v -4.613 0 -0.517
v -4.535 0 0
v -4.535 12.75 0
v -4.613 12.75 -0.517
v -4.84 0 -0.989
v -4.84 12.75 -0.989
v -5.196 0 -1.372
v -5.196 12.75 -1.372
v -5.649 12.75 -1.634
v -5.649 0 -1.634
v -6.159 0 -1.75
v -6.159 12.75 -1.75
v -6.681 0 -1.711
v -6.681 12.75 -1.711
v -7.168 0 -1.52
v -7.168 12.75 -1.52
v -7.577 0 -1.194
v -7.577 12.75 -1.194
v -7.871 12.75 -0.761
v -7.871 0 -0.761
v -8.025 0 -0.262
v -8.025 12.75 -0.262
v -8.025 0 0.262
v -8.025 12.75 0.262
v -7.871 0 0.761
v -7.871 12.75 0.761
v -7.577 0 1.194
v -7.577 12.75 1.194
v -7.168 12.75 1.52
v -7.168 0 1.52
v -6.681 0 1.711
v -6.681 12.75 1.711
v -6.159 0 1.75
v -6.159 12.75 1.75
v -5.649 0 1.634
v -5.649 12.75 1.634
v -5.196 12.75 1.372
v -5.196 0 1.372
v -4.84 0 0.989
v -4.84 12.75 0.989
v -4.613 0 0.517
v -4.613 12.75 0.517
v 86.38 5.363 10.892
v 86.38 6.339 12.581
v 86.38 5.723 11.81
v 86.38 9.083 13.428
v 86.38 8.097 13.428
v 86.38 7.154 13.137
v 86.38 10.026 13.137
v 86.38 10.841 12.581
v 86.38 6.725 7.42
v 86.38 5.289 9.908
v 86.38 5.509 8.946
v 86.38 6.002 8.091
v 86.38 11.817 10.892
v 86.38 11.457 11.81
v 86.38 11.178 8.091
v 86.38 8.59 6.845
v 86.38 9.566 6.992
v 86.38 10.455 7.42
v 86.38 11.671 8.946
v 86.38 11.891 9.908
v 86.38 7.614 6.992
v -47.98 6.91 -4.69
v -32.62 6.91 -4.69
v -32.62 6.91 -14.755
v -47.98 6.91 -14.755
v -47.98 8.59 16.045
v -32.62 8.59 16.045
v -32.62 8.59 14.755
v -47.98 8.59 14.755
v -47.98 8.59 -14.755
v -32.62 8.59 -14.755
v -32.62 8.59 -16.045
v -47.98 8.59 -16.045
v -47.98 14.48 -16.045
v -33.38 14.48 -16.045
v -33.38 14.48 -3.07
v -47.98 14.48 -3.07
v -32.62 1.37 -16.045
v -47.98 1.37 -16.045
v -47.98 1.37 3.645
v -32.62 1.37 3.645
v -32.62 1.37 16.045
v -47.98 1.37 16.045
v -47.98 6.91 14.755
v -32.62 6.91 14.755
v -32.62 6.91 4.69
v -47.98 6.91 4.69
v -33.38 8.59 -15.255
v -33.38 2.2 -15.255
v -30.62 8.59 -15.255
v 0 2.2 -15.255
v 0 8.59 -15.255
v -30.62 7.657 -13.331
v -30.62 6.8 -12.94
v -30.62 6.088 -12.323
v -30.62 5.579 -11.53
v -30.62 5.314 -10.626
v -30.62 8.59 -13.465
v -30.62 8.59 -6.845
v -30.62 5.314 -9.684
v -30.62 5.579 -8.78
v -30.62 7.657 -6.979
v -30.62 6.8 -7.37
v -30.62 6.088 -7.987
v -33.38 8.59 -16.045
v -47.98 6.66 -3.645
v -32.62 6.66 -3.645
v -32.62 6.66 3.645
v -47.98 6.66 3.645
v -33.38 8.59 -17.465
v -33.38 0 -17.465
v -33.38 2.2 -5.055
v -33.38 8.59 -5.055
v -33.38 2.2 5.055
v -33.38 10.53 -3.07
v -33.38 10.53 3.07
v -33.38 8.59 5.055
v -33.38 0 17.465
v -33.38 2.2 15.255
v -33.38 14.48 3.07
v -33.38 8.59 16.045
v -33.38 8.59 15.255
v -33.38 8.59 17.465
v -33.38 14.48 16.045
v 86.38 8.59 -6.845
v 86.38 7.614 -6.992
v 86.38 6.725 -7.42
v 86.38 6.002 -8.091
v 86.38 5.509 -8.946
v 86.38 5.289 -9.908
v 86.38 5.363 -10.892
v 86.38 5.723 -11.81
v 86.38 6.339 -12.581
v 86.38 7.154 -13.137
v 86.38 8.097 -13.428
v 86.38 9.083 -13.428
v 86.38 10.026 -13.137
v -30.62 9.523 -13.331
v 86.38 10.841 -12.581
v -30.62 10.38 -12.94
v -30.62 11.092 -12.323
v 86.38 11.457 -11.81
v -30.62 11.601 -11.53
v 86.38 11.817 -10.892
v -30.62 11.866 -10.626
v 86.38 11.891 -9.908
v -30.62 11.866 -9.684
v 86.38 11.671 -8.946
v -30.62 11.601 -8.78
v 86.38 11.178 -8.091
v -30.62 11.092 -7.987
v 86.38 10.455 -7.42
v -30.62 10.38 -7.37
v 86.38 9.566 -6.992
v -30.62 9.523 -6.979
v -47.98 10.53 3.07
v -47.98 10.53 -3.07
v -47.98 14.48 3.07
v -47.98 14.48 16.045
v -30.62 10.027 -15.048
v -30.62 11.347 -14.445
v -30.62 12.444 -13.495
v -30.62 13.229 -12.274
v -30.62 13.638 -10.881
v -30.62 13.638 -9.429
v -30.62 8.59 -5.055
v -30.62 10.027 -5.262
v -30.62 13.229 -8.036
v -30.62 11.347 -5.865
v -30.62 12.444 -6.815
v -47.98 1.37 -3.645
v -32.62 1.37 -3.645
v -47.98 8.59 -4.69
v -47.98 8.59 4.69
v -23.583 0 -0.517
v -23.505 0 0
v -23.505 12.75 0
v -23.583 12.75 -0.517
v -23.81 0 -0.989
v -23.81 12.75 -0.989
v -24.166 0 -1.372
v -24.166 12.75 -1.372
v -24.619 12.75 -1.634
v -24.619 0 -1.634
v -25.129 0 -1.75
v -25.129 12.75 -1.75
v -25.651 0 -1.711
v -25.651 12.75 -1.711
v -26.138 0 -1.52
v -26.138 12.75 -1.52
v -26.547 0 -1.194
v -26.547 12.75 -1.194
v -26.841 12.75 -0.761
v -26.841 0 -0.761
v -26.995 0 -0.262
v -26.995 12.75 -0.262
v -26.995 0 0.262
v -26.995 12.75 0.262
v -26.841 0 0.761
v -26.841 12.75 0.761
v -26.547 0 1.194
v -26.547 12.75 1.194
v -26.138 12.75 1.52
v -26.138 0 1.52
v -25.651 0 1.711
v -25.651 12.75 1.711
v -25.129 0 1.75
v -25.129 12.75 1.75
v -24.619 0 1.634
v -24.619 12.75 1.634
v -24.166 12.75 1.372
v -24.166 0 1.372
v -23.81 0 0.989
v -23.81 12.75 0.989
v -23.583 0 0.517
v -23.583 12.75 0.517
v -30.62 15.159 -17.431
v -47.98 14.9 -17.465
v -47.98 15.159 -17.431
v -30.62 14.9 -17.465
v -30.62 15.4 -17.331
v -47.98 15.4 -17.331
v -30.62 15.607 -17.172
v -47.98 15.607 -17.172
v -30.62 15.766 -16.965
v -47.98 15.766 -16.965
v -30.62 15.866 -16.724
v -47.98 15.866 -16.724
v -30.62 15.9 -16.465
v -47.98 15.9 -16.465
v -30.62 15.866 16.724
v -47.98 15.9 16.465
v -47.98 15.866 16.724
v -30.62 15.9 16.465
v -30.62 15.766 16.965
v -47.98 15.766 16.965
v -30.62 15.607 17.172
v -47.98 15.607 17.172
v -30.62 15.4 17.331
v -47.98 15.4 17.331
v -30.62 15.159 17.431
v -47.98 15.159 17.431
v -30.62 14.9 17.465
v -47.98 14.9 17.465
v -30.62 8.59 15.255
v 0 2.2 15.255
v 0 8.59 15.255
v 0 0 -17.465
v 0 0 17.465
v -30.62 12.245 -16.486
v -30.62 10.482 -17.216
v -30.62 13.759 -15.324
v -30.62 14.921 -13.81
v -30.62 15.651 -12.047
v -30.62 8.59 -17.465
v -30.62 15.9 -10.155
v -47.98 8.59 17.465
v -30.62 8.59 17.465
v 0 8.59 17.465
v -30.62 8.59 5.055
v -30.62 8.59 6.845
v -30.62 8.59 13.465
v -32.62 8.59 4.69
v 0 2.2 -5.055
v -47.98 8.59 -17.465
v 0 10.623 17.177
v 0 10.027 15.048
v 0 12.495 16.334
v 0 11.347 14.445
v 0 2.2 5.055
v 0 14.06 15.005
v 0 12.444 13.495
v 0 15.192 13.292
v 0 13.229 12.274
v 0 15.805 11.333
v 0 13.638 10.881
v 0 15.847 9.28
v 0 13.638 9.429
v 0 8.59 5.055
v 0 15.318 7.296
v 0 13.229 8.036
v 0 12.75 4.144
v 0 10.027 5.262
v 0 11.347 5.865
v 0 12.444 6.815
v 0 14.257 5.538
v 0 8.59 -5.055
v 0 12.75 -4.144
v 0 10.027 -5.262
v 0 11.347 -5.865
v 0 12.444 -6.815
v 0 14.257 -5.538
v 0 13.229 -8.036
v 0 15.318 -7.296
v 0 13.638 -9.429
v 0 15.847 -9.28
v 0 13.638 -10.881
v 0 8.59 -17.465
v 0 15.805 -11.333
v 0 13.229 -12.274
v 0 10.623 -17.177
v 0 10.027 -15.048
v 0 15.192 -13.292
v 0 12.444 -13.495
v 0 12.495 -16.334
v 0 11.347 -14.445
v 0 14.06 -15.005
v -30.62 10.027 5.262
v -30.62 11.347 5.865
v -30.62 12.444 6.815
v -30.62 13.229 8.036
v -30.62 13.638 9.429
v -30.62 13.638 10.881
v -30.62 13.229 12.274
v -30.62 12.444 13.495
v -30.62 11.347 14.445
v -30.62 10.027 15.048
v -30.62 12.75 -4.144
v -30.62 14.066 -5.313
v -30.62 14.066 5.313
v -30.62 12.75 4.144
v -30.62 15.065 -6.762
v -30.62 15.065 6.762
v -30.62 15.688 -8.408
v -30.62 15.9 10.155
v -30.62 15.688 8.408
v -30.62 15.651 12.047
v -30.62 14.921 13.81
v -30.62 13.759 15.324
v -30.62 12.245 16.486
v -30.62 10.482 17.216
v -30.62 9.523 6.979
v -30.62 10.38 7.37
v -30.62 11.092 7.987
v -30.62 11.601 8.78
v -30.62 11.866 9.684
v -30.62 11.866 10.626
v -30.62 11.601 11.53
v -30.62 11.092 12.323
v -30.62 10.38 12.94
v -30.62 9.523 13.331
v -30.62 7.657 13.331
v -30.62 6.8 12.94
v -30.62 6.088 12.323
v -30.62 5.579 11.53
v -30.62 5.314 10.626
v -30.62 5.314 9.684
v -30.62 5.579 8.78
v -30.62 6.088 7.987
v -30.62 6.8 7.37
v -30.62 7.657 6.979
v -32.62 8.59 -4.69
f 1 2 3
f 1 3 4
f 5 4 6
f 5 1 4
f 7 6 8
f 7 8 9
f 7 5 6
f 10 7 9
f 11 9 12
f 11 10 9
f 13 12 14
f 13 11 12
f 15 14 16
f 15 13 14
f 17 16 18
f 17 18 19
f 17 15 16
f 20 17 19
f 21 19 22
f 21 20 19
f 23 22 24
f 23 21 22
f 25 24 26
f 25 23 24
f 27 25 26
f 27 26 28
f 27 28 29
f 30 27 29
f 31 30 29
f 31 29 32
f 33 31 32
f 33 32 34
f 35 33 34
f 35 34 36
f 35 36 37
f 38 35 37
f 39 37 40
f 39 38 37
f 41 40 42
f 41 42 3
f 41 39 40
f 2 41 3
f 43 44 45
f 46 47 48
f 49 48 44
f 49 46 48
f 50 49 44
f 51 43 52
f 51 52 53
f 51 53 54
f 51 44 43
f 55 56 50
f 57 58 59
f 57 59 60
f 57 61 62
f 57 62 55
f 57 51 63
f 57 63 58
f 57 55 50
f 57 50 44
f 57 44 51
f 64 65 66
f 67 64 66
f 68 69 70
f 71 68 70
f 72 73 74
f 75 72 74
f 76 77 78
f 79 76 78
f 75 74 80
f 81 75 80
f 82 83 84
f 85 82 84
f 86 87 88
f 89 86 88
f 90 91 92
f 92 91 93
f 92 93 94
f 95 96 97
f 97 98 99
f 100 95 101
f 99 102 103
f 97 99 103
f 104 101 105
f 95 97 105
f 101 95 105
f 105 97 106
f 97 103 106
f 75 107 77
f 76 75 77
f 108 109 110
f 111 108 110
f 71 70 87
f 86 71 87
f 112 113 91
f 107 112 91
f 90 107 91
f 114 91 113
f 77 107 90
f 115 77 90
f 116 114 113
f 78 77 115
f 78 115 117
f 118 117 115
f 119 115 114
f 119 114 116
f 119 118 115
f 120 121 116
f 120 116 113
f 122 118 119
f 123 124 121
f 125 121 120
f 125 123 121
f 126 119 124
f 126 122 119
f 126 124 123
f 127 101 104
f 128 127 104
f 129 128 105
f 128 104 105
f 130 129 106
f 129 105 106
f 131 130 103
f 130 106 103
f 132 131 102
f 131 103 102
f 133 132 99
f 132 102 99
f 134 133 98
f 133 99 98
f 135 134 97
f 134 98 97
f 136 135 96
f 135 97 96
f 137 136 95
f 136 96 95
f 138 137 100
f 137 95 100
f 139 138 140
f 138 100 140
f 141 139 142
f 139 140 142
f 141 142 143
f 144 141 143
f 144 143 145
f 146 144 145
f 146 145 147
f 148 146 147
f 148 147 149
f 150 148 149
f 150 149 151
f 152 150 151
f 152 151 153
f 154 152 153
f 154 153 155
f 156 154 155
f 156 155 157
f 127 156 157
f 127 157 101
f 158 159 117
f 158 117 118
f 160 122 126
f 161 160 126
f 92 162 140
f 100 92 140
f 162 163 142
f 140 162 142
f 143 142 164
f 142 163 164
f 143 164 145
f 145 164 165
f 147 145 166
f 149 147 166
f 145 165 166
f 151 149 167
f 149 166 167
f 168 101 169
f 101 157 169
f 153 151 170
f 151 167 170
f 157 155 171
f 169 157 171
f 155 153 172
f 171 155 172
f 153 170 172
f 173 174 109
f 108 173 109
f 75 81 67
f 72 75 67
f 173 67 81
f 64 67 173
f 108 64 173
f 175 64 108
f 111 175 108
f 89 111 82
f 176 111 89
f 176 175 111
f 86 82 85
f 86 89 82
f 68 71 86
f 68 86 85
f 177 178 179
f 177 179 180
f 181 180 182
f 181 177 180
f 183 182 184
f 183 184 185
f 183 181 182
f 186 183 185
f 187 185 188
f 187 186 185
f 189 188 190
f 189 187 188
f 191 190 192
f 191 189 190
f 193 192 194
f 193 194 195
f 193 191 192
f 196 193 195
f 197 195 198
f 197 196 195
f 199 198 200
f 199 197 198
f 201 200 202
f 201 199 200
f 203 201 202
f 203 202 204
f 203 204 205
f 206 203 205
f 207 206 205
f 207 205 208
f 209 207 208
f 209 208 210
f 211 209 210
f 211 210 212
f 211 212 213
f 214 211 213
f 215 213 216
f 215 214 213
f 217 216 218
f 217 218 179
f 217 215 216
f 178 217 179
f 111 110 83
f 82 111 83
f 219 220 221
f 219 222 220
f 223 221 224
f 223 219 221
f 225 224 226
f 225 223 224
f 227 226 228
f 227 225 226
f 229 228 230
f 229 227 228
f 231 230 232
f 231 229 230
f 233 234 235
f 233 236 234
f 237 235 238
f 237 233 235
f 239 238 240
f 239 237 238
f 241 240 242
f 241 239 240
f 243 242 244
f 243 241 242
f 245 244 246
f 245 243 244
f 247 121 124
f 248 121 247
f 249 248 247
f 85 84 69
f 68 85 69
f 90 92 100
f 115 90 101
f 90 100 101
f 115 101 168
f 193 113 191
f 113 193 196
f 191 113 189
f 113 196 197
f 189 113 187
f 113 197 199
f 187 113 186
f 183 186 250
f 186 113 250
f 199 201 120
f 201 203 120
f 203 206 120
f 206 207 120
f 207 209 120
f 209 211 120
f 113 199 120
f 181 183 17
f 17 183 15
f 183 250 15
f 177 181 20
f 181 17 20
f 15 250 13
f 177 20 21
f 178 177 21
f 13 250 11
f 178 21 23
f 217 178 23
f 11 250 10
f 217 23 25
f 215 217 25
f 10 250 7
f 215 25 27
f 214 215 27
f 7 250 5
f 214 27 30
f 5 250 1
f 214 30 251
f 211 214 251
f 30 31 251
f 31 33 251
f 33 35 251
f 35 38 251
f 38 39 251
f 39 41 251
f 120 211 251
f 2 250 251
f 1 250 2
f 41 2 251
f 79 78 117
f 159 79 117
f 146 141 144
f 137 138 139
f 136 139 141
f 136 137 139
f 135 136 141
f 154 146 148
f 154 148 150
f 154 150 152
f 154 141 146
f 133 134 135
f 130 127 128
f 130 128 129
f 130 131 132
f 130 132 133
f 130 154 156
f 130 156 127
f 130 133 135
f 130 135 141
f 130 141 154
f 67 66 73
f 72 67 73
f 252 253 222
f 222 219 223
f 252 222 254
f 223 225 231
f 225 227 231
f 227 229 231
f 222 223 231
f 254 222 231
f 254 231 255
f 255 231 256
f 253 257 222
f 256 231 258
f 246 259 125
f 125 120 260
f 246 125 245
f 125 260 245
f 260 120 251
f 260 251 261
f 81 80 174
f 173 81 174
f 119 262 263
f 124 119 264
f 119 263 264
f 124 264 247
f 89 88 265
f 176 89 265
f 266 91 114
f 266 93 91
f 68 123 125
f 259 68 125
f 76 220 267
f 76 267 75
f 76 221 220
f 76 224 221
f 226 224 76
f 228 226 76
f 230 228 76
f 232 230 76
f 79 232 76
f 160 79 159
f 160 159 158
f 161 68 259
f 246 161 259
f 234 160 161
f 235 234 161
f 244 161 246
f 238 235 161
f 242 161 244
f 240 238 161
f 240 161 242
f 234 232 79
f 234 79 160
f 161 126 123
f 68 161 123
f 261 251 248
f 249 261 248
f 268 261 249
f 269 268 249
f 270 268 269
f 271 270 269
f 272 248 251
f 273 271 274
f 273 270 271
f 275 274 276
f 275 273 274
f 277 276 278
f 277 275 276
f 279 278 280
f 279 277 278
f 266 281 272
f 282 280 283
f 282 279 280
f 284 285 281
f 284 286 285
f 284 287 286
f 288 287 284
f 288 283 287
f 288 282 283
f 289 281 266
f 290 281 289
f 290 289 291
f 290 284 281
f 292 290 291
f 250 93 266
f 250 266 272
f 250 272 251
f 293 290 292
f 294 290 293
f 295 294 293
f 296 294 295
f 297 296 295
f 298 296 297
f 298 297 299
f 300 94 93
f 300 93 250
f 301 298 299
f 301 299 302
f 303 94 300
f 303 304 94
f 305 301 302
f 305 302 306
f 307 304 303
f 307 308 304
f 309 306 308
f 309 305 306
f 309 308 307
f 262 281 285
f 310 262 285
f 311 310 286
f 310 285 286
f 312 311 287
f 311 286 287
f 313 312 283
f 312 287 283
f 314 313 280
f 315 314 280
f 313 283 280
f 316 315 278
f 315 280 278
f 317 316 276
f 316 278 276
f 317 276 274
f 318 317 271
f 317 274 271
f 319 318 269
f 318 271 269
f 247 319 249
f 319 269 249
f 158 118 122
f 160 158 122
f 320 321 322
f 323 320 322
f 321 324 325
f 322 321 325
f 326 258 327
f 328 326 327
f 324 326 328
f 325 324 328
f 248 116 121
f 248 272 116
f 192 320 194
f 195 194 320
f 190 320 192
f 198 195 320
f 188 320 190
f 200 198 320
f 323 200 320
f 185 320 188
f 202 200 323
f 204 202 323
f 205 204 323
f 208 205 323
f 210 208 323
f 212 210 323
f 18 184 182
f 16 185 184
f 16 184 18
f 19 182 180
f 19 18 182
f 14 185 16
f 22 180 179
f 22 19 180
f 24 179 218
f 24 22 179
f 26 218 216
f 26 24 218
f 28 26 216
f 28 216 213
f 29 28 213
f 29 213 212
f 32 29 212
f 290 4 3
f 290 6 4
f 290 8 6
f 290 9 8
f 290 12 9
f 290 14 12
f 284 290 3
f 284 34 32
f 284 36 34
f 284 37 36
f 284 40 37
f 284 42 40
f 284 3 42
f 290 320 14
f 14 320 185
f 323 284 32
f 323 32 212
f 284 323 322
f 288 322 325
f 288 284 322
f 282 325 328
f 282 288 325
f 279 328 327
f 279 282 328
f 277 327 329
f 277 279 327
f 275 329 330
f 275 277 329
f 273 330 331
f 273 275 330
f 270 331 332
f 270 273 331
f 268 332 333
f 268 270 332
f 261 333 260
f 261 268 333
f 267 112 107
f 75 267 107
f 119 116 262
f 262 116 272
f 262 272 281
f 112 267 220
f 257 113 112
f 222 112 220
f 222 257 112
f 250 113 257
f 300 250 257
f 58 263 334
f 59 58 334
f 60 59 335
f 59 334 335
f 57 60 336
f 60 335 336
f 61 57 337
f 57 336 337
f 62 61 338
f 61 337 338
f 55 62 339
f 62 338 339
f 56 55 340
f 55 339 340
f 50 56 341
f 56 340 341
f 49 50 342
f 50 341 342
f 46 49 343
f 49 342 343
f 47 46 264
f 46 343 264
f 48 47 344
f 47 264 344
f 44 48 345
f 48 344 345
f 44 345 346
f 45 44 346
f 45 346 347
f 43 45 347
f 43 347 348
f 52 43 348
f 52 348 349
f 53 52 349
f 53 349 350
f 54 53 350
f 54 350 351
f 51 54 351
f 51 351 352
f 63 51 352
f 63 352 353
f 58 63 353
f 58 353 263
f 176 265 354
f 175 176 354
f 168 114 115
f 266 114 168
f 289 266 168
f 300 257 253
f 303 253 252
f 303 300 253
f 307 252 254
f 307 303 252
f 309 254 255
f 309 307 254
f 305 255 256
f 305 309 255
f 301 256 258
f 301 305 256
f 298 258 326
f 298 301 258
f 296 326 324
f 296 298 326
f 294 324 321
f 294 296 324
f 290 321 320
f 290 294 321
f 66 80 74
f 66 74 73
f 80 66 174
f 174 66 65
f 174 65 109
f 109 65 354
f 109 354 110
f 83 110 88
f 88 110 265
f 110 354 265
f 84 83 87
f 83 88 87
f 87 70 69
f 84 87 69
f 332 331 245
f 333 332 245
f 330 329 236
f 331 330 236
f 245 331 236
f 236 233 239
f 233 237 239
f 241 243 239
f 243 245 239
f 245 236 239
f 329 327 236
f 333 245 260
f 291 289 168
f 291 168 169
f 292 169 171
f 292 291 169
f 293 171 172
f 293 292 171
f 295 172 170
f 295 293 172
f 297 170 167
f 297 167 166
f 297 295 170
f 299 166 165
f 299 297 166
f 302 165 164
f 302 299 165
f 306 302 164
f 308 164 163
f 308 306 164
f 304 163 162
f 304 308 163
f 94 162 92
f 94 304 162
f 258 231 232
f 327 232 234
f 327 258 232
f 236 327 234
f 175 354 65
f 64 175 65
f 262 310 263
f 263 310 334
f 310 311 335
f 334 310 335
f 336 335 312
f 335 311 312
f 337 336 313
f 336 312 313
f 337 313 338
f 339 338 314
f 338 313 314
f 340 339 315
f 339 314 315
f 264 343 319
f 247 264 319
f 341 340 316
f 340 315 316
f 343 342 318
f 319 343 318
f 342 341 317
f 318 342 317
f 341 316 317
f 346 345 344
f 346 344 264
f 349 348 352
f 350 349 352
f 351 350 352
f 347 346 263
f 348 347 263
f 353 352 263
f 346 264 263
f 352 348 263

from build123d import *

# Parameters (mm, degrees)
EXTRUDE1_DEPTH  = 30.62
SKETCH2_W       = 34.93
SKETCH2_H       = 15.9
SKETCH2_W_2     = 10.2
SKETCH2_H_2     = 6.39
EXTRUDE2_DEPTH  = 2.76
EXTRUDE3_DEPTH  = 15.36
EXTRUDE4_DEPTH  = 15.36
FILLET1_R       = 1
SKETCH4_R       = 3.31
EXTRUDE5_DEPTH  = 117
HOLE1_OUTLINE_R = 1.755
HOLE1_DEPTH     = 12.75
LPATTERN1_COUNT = 2
LPATTERN1_PITCH = 18.97


# Read off the part's stored shape, not the designer's step: Hole1
with BuildPart() as part:
    # Sketch1 → Extrude1 (new body)
    with BuildSketch(Plane(origin=(0, 0, 0), x_dir=(0, 0, -1), z_dir=(1, 0, 0))):
        with BuildLine():
            Line((4.144134838, 12.75), (-4.144134838, 12.75))
            ThreePointArc((-4.144134838, 12.75), (-12.334068111, 15.567661655), (-17.465, 8.59))
            Line((-17.465, 8.59), (-17.465, 0))
            Line((-17.465, 0), (17.465, 0))
            Line((17.465, 0), (17.465, 8.59))
            ThreePointArc((17.465, 8.59), (12.334068111, 15.567661655), (4.144134838, 12.75))
        make_face()
        with BuildLine():
            Line((-15.255, 8.59), (-15.255, 2.2))
            Line((-15.255, 2.2), (-5.055, 2.2))
            Line((-5.055, 2.2), (-5.055, 8.59))
            ThreePointArc((-5.055, 8.59), (-10.155, 13.69), (-15.255, 8.59))
        make_face(mode=Mode.SUBTRACT)
        with BuildLine():
            Line((5.055, 2.2), (5.055, 8.59))
            ThreePointArc((5.055, 8.59), (10.155, 13.69), (15.255, 8.59))
            Line((15.255, 8.59), (15.255, 2.2))
            Line((15.255, 2.2), (5.055, 2.2))
        make_face(mode=Mode.SUBTRACT)
    extrude(amount=-EXTRUDE1_DEPTH)

    # Sketch2 → Extrude2 (add)
    with BuildSketch(Plane.ZY.offset(30.62)):
        with Locations((0, 7.95)):
            Rectangle(SKETCH2_W, SKETCH2_H)
        with Locations((-10.155, 5.395)):
            Rectangle(SKETCH2_W_2, SKETCH2_H_2, mode=Mode.SUBTRACT)
        with Locations((10.155, 5.395)):
            Rectangle(SKETCH2_W_2, SKETCH2_H_2, mode=Mode.SUBTRACT)
    extrude(amount=EXTRUDE2_DEPTH)

    # Sketch3 → Extrude3 (add)
    with BuildSketch(Plane.ZY.offset(32.62)):
        Polygon((0, 10.53), (0, 15.9), (-17.465, 15.9), (-17.465, 8.59), (-16.045, 8.59), (-16.045, 14.48), (-3.07, 14.48), (-3.07, 10.53), align=None)
        Polygon((17.465, 15.9), (0, 15.9), (0, 10.53), (3.07, 10.53), (3.07, 14.48), (16.045, 14.48), (16.045, 8.59), (17.465, 8.59), align=None)
    extrude(amount=EXTRUDE3_DEPTH)

    # Fillet1
    fillet1_edges = [part.edges().sort_by_distance(p)[0] for p in [
        (-39.3, 15.9, -17.465),
        (-39.3, 15.9, 17.465),
    ]]
    fillet(fillet1_edges, radius=FILLET1_R)

    # Sketch4 → Extrude5 (add)
    with BuildSketch(Plane(origin=(-30.62, 0, 0), x_dir=(0, 0, -1), z_dir=(1, 0, 0))):
        with Locations((-10.155, 8.59)):
            Circle(SKETCH4_R)
        with Locations(Location((10.155, 8.59, 0), (0, 0, 180))):
            Circle(SKETCH4_R)
    extrude(amount=EXTRUDE5_DEPTH)

    # Hole1 outline → Hole1 (cut)
    with BuildSketch(Plane(origin=(0, 0, 0), x_dir=(1, 0, 0), z_dir=(0, 1, 0))):
        with Locations((-6.29, 0)):
            Circle(HOLE1_OUTLINE_R)
    hole1 = extrude(amount=HOLE1_DEPTH, mode=Mode.SUBTRACT)

    # LPattern1: Hole1 ×2
    with Locations(*[(-i * LPATTERN1_PITCH, 0, 0) for i in range(1, LPATTERN1_COUNT)]):
        add(hole1, mode=Mode.SUBTRACT)


with BuildPart() as body_2:
    # Sketch → Extrude4 (new body)
    with BuildSketch(Plane.ZY.offset(32.62)):
        Polygon((0, 6.66), (0, 8.59), (-4.69, 8.59), (-4.69, 6.91), (-14.755, 6.91), (-14.755, 8.59), (-16.045, 8.59), (-16.045, 1.37), (-3.645, 1.37), (-3.645, 6.66), align=None)
        Polygon((4.69, 8.59), (0, 8.59), (0, 6.66), (3.645, 6.66), (3.645, 1.37), (16.045, 1.37), (16.045, 8.59), (14.755, 8.59), (14.755, 6.91), (4.69, 6.91), align=None)
    extrude(amount=EXTRUDE4_DEPTH)


solid = Compound([part.part, body_2.part])
